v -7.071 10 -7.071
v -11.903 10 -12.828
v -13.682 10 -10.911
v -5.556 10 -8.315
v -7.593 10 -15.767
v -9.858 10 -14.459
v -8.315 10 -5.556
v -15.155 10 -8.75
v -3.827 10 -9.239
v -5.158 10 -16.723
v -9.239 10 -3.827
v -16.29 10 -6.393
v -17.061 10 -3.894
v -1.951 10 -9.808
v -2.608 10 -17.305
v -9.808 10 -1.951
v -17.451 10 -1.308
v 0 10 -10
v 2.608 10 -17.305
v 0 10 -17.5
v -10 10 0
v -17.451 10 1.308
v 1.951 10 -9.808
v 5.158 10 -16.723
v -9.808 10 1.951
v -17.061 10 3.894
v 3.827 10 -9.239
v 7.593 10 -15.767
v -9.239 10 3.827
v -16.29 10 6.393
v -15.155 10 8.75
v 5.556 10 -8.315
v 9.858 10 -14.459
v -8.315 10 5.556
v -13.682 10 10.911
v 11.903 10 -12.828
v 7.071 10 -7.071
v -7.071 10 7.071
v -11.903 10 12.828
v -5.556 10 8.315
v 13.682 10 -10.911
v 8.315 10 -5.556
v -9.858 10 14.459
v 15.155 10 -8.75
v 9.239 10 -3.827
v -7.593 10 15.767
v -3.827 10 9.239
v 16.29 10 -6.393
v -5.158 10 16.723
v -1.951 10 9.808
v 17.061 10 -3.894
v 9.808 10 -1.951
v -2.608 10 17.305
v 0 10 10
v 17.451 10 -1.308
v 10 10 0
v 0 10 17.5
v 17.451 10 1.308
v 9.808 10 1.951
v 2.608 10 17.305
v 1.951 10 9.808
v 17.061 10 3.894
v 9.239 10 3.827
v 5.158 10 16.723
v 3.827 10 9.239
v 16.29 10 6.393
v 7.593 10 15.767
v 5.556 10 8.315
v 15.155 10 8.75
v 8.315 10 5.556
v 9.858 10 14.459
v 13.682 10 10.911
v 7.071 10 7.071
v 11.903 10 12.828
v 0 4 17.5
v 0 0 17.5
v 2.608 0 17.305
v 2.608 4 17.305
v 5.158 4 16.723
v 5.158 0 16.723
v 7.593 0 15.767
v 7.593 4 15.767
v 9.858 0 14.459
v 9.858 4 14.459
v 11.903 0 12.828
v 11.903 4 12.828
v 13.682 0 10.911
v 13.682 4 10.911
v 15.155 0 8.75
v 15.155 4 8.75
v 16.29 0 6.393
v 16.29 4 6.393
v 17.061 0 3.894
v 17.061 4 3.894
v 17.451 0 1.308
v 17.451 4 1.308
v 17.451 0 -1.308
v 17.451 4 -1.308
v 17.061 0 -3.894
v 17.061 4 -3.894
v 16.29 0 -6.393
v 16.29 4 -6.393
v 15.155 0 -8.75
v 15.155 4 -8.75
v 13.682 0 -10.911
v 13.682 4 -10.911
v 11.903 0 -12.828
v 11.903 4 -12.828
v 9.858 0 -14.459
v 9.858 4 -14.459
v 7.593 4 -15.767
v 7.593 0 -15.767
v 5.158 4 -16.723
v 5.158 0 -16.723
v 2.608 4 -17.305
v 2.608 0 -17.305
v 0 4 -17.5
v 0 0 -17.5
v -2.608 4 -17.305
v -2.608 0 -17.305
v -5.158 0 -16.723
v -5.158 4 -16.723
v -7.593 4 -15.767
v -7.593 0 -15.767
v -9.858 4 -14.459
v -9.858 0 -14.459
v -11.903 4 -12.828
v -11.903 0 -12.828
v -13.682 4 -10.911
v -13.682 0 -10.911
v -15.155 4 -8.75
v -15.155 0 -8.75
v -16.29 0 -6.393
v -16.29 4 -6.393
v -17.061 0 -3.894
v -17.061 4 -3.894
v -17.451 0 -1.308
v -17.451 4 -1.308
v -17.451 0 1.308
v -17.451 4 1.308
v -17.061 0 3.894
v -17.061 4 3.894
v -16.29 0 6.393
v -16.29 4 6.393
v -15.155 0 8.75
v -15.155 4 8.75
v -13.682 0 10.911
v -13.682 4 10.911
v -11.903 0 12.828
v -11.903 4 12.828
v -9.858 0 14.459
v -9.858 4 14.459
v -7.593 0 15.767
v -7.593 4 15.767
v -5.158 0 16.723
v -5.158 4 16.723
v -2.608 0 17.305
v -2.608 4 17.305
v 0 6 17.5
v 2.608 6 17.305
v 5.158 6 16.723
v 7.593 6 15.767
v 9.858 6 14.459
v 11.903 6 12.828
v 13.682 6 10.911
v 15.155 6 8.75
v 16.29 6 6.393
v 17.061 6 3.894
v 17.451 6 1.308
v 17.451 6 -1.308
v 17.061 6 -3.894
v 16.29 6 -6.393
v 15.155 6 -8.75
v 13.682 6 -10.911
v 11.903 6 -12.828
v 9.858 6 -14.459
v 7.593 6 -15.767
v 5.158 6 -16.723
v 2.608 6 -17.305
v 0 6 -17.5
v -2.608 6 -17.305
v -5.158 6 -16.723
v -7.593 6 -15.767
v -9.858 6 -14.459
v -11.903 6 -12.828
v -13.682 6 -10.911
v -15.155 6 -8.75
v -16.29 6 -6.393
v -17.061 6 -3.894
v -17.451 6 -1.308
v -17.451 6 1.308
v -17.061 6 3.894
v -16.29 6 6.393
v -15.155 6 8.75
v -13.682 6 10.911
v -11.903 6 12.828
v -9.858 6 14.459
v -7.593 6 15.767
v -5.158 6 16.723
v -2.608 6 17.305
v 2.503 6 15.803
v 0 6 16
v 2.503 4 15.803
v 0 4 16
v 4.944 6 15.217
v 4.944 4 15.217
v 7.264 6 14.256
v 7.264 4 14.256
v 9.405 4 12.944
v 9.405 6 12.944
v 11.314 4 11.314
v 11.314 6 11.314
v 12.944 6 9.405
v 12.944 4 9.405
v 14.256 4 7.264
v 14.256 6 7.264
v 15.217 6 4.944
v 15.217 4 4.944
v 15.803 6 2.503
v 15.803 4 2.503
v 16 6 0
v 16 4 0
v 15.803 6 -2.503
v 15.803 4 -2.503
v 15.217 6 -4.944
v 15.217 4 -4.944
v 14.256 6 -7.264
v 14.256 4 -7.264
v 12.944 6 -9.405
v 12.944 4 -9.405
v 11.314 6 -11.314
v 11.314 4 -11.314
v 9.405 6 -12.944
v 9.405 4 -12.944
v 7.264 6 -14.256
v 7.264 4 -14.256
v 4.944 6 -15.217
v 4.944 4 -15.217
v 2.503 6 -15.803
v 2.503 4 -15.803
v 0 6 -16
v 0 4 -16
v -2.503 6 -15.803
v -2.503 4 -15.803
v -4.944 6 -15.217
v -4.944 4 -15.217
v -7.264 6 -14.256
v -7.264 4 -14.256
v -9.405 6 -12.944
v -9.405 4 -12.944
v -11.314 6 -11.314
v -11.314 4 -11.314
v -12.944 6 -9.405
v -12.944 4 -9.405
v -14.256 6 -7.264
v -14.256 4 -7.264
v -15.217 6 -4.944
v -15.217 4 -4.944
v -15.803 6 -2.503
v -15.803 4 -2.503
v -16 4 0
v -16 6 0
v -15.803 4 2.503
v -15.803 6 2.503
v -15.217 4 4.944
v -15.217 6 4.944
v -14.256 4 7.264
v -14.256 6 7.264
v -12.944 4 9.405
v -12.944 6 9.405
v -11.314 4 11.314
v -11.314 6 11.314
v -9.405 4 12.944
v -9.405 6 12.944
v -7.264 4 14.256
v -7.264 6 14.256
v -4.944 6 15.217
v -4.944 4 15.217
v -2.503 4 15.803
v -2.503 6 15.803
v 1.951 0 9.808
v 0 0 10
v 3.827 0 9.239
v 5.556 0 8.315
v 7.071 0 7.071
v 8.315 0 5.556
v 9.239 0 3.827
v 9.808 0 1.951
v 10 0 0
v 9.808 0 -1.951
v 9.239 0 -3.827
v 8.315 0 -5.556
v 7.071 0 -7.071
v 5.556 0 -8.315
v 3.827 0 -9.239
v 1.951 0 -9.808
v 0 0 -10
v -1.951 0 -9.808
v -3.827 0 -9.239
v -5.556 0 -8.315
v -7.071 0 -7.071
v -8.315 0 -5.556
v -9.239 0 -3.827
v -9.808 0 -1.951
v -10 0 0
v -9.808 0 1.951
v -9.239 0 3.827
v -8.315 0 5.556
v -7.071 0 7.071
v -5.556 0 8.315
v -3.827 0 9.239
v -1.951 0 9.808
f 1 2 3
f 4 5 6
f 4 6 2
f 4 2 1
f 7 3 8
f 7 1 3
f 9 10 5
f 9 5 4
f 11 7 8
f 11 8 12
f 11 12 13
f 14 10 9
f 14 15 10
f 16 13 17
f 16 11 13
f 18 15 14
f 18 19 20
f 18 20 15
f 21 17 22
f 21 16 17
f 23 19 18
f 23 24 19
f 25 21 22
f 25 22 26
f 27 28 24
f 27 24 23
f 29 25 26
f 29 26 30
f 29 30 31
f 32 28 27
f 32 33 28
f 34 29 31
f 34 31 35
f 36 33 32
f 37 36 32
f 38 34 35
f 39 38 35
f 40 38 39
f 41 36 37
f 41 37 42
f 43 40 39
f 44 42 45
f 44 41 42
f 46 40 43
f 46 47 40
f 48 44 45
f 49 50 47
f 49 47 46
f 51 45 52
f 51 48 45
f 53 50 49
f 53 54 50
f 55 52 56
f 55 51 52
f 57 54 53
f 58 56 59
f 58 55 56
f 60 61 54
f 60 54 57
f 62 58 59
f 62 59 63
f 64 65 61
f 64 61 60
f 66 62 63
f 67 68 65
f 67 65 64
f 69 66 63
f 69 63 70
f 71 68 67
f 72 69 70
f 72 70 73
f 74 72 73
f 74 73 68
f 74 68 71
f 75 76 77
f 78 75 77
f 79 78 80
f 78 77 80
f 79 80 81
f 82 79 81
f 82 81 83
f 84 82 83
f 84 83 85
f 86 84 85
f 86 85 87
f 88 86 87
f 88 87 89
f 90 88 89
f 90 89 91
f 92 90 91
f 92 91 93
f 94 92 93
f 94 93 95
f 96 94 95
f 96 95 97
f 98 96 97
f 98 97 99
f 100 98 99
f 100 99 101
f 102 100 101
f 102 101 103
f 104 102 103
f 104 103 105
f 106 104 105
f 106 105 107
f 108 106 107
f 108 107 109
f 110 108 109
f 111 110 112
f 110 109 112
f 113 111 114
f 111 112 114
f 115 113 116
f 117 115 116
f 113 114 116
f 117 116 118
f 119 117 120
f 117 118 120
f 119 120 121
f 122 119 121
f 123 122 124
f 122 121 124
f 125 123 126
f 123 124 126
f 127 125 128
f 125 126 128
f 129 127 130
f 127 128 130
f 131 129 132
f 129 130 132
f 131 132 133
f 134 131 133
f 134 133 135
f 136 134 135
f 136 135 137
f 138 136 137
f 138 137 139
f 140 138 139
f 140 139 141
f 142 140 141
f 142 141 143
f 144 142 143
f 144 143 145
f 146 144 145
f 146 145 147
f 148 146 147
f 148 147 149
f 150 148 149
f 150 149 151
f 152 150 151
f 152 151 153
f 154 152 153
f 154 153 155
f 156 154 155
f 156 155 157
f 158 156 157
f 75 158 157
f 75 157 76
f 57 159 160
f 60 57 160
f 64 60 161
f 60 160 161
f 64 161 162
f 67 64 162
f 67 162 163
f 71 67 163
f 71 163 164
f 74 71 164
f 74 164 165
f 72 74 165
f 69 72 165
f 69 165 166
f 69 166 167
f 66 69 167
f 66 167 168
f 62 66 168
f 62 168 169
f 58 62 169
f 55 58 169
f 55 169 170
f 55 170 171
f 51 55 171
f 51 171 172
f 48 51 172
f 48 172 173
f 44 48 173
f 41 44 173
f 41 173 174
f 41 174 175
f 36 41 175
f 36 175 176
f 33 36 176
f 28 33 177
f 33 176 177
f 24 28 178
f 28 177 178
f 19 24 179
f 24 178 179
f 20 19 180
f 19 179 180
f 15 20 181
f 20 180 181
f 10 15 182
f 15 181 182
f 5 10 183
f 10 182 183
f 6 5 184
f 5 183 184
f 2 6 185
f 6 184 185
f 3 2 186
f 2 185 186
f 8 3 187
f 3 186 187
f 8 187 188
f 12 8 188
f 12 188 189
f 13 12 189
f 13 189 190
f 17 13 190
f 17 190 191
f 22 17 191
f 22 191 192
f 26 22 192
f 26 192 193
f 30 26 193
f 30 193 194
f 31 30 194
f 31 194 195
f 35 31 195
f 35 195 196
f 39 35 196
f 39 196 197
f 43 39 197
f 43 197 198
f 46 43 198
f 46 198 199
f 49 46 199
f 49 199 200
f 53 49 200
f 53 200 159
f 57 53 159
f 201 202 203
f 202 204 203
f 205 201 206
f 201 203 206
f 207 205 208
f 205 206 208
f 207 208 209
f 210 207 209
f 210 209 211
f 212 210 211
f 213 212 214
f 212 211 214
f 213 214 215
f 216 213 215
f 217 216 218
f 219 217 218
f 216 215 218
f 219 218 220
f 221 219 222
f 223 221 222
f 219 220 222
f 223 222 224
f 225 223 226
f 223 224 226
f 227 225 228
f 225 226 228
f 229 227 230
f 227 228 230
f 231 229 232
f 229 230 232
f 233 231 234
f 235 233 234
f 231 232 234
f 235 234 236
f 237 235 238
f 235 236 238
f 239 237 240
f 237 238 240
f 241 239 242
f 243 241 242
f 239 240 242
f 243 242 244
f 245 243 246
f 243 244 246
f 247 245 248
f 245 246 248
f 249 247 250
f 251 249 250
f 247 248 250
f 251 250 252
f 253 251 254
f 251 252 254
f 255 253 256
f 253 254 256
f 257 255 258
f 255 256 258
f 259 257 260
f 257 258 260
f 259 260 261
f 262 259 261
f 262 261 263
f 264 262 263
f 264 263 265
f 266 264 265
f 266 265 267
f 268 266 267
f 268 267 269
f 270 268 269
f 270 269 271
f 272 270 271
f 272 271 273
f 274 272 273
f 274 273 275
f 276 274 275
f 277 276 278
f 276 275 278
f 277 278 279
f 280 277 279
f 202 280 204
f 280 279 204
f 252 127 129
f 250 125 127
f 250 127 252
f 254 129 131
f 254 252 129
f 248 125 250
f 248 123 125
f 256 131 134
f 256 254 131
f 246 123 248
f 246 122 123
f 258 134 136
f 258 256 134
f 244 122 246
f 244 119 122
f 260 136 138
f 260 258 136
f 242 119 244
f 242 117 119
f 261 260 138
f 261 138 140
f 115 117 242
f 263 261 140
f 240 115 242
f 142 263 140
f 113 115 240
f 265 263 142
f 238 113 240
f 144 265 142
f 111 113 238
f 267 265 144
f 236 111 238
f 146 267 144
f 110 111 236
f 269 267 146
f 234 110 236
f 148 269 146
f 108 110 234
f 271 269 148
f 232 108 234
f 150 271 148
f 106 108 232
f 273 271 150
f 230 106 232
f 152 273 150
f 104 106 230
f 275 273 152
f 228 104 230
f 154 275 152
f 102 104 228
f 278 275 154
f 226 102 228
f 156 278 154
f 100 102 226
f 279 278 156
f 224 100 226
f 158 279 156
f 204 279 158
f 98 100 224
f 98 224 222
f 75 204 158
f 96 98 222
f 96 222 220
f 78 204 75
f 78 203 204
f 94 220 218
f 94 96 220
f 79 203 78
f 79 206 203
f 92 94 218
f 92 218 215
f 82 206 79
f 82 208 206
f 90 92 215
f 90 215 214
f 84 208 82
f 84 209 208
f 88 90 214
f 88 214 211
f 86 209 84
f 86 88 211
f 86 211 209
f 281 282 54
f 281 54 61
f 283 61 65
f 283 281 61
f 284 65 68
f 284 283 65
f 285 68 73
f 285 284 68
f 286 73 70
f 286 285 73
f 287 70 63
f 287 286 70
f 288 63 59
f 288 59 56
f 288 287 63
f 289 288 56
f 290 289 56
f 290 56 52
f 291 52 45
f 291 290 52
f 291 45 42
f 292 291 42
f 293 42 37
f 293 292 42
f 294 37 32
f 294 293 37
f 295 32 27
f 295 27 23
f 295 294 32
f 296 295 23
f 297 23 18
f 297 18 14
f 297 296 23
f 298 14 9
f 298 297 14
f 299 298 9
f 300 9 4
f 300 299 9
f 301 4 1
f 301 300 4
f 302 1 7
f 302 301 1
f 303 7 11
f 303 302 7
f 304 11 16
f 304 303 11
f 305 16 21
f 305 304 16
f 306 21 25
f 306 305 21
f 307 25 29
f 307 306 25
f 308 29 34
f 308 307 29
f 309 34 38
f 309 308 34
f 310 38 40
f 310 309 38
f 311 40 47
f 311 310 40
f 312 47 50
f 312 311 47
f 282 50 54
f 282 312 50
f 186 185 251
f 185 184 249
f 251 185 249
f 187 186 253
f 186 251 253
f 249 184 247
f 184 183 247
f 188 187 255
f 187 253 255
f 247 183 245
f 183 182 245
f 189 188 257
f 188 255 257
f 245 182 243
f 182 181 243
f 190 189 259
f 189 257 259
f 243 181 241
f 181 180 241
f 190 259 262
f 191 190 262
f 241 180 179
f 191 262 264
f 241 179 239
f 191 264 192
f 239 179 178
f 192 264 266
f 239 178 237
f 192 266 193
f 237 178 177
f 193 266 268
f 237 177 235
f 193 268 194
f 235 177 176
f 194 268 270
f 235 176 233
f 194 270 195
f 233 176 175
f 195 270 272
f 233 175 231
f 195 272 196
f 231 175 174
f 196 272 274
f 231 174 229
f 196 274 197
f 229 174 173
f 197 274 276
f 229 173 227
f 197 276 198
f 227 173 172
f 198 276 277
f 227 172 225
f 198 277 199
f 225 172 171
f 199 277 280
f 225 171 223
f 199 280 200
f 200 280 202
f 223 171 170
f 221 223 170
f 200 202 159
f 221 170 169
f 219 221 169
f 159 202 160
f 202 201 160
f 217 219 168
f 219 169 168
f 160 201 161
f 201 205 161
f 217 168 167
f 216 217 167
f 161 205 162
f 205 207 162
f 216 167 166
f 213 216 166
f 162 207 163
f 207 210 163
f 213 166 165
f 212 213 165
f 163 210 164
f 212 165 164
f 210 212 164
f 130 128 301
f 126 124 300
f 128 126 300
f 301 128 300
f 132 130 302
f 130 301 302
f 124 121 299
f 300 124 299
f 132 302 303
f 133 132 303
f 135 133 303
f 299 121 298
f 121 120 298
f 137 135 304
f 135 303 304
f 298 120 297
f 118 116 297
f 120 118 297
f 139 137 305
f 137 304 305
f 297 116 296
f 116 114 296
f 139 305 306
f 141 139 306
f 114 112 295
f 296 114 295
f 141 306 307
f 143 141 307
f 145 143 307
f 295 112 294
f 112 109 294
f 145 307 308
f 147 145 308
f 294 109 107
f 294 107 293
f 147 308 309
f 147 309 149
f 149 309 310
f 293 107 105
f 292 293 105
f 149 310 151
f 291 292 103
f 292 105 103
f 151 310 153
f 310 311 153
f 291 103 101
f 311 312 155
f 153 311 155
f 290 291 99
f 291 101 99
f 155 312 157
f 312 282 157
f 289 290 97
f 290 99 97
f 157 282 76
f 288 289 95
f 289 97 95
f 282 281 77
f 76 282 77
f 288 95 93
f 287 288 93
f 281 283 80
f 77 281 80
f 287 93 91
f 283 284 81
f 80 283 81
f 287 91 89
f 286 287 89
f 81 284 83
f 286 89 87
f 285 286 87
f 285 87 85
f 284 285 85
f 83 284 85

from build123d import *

# Parameters (mm, degrees)
SKETCH_1_R          = 17.5
SKETCH_1_R_2        = 10
EXTRUDE_1_DEPTH     = 10
SKETCH_4_R          = 17.5
SKETCH_4_R_2        = 16
CUT_EXTRUDE_1_DEPTH = 1


with BuildPart() as part:
    # 草图1 → 凸台-拉伸1 (new body)
    with BuildSketch(Plane(origin=(0, 0, 0), x_dir=(1, 0, 0), z_dir=(0, 1, 0))):
        with Locations(Location((0, 0, 0), (0, 0, 270))):
            Circle(SKETCH_1_R)
        with Locations(Location((0, 0, 0), (0, 0, 270))):
            Circle(SKETCH_1_R_2, mode=Mode.SUBTRACT)
    extrude(amount=EXTRUDE_1_DEPTH)

    # 草图4 → 切除-拉伸1 (cut, symmetric)
    with BuildSketch(Plane(origin=(0, 5, 0), x_dir=(1, 0, 0), z_dir=(0, 1, 0))):
        with Locations(Location((0, 0, 0), (0, 0, 270))):
            Circle(SKETCH_4_R)
        with Locations(Location((0, 0, 0), (0, 0, 270))):
            Circle(SKETCH_4_R_2, mode=Mode.SUBTRACT)
    extrude(amount=CUT_EXTRUDE_1_DEPTH, both=True, mode=Mode.SUBTRACT)


solid = part.part
